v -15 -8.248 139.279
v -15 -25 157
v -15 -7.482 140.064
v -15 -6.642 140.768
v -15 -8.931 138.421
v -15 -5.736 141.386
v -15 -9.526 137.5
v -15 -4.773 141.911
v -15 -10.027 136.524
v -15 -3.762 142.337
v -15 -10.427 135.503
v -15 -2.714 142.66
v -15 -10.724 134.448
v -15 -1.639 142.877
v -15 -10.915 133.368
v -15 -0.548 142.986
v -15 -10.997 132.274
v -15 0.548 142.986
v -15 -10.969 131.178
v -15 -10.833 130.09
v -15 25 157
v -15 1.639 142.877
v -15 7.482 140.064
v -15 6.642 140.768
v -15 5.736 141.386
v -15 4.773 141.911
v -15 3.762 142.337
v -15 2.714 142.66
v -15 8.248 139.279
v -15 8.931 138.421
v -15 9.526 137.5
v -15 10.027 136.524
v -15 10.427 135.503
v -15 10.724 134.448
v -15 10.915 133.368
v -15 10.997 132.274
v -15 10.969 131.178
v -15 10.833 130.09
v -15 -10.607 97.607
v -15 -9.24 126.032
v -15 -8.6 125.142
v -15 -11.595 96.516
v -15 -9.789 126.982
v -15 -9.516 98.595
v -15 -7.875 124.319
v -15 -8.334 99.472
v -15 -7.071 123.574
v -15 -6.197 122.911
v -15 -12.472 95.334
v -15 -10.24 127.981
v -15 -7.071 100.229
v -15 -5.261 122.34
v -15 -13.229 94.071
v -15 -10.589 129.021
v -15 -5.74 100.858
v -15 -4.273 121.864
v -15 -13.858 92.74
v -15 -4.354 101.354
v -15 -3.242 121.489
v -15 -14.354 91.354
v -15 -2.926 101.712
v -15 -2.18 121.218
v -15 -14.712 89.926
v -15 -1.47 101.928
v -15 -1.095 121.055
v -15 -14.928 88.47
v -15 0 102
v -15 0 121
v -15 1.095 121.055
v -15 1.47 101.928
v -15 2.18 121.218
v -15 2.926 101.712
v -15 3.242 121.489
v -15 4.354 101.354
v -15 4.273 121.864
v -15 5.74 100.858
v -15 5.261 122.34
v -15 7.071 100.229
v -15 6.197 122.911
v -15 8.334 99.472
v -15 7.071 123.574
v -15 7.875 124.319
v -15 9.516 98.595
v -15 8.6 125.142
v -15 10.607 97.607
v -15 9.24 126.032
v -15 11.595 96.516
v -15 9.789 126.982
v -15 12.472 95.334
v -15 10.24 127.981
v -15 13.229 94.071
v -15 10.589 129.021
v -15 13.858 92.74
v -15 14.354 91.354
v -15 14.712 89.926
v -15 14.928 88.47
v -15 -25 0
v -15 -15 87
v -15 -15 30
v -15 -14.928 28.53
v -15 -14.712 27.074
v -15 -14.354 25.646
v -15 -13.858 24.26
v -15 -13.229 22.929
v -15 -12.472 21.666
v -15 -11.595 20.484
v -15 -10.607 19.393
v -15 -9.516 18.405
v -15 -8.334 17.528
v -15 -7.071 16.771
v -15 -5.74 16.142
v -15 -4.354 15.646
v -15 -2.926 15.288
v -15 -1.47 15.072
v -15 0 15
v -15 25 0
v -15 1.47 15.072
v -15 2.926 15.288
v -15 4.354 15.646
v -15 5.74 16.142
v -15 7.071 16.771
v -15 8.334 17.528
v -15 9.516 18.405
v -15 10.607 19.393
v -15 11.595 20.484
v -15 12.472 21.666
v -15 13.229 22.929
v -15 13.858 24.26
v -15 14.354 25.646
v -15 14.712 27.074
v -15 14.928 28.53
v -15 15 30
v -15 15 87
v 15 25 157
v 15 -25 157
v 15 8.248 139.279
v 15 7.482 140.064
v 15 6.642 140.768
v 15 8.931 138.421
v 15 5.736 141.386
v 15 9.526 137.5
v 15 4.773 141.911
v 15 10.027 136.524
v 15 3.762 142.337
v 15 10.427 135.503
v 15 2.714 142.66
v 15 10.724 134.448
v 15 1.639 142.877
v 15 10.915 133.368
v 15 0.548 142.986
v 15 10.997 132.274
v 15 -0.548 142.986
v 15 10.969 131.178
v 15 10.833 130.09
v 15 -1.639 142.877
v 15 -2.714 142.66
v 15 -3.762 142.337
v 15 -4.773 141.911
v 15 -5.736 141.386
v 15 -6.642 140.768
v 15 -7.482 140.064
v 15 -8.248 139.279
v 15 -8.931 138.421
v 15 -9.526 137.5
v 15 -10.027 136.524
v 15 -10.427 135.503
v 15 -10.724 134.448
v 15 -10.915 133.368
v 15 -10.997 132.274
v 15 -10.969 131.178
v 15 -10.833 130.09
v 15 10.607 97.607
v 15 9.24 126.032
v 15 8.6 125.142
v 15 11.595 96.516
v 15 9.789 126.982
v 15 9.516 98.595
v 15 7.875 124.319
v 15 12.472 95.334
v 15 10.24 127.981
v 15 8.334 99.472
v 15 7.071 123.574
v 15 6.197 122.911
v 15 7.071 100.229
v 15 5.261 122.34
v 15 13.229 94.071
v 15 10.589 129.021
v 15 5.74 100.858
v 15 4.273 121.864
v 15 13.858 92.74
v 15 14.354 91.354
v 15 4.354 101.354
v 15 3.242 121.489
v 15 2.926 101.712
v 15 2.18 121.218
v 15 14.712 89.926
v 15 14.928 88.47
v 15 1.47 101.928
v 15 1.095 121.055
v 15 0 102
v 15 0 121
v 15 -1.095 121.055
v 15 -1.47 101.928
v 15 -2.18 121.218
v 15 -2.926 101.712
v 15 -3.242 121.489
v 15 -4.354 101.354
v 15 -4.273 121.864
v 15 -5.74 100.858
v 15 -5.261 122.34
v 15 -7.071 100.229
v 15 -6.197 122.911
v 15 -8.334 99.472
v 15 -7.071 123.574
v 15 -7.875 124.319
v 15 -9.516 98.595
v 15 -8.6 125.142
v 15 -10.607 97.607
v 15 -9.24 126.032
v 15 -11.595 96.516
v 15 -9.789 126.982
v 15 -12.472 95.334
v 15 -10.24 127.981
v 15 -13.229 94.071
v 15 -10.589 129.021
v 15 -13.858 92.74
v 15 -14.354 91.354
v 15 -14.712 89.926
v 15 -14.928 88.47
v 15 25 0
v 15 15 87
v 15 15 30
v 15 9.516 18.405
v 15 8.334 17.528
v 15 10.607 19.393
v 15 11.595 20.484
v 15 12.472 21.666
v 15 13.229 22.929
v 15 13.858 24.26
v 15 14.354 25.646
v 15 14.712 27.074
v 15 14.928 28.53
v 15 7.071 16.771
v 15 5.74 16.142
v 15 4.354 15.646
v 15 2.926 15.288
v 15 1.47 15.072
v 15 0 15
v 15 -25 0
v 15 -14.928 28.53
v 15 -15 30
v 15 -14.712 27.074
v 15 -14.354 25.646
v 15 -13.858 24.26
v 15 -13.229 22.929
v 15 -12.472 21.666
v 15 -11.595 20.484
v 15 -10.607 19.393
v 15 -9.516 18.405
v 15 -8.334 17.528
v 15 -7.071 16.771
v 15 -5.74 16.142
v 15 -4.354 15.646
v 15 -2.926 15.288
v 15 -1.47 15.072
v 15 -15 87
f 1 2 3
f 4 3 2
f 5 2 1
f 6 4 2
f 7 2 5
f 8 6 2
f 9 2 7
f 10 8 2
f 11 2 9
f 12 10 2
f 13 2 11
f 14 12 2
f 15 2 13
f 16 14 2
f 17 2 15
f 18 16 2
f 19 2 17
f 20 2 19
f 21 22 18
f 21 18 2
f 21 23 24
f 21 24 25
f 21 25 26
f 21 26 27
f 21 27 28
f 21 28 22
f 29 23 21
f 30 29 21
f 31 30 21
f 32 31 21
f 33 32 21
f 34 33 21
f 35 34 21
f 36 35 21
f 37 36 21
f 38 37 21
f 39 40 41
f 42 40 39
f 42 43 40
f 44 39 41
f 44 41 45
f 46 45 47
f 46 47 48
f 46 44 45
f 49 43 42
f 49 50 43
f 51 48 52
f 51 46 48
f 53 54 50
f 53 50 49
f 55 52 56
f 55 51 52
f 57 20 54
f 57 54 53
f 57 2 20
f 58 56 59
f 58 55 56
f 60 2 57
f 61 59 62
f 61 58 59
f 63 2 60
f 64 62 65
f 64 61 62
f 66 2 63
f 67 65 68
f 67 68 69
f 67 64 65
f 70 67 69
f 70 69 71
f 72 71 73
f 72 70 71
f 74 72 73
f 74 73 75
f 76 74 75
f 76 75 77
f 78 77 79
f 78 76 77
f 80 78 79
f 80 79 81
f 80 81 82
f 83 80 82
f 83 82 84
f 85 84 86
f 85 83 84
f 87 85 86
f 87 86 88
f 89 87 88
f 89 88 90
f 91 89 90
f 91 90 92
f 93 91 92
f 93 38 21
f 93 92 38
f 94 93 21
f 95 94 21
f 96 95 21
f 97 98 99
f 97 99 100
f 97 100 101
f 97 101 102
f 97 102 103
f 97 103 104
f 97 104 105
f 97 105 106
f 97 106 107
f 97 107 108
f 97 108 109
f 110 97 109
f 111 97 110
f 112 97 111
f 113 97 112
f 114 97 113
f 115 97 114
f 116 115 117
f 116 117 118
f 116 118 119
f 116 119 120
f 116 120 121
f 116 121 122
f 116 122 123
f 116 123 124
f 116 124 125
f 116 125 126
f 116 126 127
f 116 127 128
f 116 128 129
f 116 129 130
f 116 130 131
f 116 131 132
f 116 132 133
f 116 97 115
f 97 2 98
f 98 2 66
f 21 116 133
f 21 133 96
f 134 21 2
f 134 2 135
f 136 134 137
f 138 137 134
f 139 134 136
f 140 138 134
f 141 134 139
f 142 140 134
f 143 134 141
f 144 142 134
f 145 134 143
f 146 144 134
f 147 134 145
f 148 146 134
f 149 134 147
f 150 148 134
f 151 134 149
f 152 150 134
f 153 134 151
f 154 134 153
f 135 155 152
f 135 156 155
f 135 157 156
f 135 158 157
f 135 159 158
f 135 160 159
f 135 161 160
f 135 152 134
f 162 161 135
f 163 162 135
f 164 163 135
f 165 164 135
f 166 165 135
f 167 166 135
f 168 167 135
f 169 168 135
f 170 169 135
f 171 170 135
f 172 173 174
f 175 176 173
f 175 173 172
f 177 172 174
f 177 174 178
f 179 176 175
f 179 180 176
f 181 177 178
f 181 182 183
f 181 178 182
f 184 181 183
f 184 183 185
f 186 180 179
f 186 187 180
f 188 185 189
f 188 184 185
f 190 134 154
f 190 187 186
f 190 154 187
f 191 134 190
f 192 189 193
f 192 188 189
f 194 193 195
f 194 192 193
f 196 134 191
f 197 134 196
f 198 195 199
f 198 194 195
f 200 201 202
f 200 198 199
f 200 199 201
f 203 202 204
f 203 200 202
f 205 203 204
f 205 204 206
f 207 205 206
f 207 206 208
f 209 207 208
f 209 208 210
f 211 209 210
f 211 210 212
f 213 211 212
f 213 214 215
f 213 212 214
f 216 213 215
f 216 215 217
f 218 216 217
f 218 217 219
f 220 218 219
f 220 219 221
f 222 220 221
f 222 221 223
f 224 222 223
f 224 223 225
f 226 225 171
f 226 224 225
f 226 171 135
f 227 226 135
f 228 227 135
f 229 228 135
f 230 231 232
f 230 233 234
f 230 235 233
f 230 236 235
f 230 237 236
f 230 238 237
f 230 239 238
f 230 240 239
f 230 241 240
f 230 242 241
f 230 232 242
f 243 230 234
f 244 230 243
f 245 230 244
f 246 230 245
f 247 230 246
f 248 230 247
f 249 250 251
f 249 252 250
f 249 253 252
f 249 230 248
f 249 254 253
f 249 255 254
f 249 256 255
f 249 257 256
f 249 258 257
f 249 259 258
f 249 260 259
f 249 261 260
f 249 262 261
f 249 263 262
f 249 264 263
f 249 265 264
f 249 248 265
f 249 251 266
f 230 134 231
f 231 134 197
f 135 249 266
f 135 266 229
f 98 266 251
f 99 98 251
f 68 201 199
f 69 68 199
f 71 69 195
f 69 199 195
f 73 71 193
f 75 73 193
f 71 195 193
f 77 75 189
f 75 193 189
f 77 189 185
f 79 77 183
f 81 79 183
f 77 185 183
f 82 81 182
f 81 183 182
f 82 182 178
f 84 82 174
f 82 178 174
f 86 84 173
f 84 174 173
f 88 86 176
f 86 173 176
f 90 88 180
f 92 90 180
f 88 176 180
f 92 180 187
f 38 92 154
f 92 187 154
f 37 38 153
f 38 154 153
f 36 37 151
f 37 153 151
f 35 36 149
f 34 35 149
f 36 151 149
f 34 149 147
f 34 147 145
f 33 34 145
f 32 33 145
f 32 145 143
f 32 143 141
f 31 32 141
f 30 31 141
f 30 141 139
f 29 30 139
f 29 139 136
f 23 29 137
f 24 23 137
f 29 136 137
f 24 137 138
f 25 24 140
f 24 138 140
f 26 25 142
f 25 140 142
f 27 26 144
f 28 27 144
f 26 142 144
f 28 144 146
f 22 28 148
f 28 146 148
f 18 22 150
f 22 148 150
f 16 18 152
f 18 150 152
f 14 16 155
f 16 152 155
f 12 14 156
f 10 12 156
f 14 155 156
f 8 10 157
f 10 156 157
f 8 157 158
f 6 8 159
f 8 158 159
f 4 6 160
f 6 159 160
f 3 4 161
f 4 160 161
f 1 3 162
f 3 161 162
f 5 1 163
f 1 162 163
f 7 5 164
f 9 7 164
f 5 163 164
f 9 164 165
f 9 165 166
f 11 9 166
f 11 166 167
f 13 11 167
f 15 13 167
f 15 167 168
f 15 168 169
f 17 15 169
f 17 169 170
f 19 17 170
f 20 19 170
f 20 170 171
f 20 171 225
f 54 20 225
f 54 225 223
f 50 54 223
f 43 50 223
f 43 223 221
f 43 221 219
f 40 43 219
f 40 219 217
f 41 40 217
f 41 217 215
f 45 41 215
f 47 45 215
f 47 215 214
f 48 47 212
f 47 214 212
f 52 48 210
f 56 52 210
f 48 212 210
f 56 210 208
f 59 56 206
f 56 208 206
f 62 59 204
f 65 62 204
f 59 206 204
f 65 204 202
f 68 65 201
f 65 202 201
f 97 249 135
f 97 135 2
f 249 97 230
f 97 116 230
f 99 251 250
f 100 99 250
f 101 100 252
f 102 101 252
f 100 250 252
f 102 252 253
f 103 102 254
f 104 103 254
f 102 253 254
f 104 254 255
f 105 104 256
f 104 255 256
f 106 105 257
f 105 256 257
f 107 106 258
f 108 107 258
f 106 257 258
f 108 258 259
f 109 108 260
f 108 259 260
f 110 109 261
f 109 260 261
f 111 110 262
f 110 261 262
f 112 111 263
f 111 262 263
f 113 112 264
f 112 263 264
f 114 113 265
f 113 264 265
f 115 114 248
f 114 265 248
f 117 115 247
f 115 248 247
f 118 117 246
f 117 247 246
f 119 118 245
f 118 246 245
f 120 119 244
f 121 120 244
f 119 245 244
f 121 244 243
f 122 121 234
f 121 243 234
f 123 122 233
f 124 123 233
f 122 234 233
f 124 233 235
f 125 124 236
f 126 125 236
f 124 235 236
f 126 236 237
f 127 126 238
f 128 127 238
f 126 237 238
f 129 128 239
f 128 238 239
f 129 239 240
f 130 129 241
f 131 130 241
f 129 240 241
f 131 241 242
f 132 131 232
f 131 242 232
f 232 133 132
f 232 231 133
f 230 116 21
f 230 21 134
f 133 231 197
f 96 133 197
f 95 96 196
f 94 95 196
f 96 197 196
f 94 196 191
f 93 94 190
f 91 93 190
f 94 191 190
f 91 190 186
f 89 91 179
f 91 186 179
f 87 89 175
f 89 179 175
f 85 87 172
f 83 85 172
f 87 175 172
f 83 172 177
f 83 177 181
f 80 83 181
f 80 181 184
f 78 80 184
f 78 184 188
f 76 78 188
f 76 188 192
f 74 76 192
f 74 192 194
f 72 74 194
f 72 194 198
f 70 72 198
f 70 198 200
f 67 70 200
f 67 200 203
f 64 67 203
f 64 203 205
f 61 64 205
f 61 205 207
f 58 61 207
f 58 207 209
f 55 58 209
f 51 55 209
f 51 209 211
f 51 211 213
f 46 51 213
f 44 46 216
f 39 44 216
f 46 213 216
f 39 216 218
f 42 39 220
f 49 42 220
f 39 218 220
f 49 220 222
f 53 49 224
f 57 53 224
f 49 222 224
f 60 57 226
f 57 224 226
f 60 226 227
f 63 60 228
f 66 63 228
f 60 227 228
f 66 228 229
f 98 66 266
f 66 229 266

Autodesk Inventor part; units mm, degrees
ref_plane "YZ Plane" through (0, 0, 0) normal (1, 0, 0) x (0, 1, 0)
ref_plane "Startebene" through (0, 0, 0) normal (0, 0, 1) x (1, 0, 0)
ref_plane "Endebene" through (0, 0, 157) normal (0, 0, 1) x (1, 0, 0)
sketch "Skizze" plane through (0, 0, 0) normal (0, 0, 1) x (1, 0, 0)
  line L0 (15, -25) -> (-15, -25)
  line L1 (-15, -25) -> (-15, 25)
  line L2 (-15, 25) -> (15, 25)
  line L3 (15, 25) -> (15, -25)
  line L4 (-6, 0) -> (8, 0) construction
  line L5 (0, -30) -> (0, 40) construction
  line L6 (0, 54) -> (0, -44) construction
  line L7 (-9.2, 0) -> (13.2, 0) construction
  dimension "d0" = 50
  dimension "d1" = 30
  dimension "d4" = 15
  dimension "d5" = 25
extrude "Körper" add sketch "Skizze" along normal up to surface (157 mm away) from surface at 0
sketch "Sketch3" plane through (0, 0, 0) normal (0, 0, 1) x (1, 0, 0)
  line L0 (0, 0) -> (10, 0)
ref_plane "Work Plane3" through (0, 0, 0) normal (0, -1, 0) x (1, 0, 0)
sketch "Sketch4" plane through (0, 0, 0) normal (0, -1, 0) x (1, 0, 0)
  line L0 (-2, 0) -> (12, 0)
  line L1 (-2, 157) -> (12, 157)
  dimension "d9" = 157
sketch "Skizze5" plane through (15, -25, 157) normal (1, 0, 0) x (0, 0, -1)
  line L0 (157, 50) -> (0, 50) projected
  circle A0 centre (25, 25) radius 11
  arc A1 (70, 40) -> (70, 10) centre (70, 25) ccw
  arc A2 (127, 10) -> (127, 40) centre (127, 25) ccw
  line L1 (70, 40) -> (127, 40)
  line L2 (70, 10) -> (127, 10)
  line L3 (0, 50) -> (0, 0) projected
  point P0 (157, 25)
  dimension "d10" = 57
  dimension "d11" = 30
  dimension "d14" = 22
  dimension "d15" = 25
  dimension "d16" = 25
  dimension "d19" = 70
  dimension "d21" = 25
extrude "Extrusion2" cut sketch "Skizze5" against normal up to next
equation "\"d0\" = G_W"
equation "\"d1\" = G_H"
equation "\"d4\" = 0.5 * d1"
equation "\"d5\" = 0.5 * d0"
equation "\"d2\" = G_L"
equation "\"G_W\" = 50"
equation "\"G_H\" = 30"
equation "\"G_L\" = d9"
equation "\"G_OFFSET_START\" = 0"
equation "\"G_OFFSET_END\" = 0"
equation "\"d7\" = G_OFFSET_END + B_L"
equation "\"B_L\" = 157"
properties part number "EN 10058 - 50 x 30 - 157" material "Stahl, weich"
